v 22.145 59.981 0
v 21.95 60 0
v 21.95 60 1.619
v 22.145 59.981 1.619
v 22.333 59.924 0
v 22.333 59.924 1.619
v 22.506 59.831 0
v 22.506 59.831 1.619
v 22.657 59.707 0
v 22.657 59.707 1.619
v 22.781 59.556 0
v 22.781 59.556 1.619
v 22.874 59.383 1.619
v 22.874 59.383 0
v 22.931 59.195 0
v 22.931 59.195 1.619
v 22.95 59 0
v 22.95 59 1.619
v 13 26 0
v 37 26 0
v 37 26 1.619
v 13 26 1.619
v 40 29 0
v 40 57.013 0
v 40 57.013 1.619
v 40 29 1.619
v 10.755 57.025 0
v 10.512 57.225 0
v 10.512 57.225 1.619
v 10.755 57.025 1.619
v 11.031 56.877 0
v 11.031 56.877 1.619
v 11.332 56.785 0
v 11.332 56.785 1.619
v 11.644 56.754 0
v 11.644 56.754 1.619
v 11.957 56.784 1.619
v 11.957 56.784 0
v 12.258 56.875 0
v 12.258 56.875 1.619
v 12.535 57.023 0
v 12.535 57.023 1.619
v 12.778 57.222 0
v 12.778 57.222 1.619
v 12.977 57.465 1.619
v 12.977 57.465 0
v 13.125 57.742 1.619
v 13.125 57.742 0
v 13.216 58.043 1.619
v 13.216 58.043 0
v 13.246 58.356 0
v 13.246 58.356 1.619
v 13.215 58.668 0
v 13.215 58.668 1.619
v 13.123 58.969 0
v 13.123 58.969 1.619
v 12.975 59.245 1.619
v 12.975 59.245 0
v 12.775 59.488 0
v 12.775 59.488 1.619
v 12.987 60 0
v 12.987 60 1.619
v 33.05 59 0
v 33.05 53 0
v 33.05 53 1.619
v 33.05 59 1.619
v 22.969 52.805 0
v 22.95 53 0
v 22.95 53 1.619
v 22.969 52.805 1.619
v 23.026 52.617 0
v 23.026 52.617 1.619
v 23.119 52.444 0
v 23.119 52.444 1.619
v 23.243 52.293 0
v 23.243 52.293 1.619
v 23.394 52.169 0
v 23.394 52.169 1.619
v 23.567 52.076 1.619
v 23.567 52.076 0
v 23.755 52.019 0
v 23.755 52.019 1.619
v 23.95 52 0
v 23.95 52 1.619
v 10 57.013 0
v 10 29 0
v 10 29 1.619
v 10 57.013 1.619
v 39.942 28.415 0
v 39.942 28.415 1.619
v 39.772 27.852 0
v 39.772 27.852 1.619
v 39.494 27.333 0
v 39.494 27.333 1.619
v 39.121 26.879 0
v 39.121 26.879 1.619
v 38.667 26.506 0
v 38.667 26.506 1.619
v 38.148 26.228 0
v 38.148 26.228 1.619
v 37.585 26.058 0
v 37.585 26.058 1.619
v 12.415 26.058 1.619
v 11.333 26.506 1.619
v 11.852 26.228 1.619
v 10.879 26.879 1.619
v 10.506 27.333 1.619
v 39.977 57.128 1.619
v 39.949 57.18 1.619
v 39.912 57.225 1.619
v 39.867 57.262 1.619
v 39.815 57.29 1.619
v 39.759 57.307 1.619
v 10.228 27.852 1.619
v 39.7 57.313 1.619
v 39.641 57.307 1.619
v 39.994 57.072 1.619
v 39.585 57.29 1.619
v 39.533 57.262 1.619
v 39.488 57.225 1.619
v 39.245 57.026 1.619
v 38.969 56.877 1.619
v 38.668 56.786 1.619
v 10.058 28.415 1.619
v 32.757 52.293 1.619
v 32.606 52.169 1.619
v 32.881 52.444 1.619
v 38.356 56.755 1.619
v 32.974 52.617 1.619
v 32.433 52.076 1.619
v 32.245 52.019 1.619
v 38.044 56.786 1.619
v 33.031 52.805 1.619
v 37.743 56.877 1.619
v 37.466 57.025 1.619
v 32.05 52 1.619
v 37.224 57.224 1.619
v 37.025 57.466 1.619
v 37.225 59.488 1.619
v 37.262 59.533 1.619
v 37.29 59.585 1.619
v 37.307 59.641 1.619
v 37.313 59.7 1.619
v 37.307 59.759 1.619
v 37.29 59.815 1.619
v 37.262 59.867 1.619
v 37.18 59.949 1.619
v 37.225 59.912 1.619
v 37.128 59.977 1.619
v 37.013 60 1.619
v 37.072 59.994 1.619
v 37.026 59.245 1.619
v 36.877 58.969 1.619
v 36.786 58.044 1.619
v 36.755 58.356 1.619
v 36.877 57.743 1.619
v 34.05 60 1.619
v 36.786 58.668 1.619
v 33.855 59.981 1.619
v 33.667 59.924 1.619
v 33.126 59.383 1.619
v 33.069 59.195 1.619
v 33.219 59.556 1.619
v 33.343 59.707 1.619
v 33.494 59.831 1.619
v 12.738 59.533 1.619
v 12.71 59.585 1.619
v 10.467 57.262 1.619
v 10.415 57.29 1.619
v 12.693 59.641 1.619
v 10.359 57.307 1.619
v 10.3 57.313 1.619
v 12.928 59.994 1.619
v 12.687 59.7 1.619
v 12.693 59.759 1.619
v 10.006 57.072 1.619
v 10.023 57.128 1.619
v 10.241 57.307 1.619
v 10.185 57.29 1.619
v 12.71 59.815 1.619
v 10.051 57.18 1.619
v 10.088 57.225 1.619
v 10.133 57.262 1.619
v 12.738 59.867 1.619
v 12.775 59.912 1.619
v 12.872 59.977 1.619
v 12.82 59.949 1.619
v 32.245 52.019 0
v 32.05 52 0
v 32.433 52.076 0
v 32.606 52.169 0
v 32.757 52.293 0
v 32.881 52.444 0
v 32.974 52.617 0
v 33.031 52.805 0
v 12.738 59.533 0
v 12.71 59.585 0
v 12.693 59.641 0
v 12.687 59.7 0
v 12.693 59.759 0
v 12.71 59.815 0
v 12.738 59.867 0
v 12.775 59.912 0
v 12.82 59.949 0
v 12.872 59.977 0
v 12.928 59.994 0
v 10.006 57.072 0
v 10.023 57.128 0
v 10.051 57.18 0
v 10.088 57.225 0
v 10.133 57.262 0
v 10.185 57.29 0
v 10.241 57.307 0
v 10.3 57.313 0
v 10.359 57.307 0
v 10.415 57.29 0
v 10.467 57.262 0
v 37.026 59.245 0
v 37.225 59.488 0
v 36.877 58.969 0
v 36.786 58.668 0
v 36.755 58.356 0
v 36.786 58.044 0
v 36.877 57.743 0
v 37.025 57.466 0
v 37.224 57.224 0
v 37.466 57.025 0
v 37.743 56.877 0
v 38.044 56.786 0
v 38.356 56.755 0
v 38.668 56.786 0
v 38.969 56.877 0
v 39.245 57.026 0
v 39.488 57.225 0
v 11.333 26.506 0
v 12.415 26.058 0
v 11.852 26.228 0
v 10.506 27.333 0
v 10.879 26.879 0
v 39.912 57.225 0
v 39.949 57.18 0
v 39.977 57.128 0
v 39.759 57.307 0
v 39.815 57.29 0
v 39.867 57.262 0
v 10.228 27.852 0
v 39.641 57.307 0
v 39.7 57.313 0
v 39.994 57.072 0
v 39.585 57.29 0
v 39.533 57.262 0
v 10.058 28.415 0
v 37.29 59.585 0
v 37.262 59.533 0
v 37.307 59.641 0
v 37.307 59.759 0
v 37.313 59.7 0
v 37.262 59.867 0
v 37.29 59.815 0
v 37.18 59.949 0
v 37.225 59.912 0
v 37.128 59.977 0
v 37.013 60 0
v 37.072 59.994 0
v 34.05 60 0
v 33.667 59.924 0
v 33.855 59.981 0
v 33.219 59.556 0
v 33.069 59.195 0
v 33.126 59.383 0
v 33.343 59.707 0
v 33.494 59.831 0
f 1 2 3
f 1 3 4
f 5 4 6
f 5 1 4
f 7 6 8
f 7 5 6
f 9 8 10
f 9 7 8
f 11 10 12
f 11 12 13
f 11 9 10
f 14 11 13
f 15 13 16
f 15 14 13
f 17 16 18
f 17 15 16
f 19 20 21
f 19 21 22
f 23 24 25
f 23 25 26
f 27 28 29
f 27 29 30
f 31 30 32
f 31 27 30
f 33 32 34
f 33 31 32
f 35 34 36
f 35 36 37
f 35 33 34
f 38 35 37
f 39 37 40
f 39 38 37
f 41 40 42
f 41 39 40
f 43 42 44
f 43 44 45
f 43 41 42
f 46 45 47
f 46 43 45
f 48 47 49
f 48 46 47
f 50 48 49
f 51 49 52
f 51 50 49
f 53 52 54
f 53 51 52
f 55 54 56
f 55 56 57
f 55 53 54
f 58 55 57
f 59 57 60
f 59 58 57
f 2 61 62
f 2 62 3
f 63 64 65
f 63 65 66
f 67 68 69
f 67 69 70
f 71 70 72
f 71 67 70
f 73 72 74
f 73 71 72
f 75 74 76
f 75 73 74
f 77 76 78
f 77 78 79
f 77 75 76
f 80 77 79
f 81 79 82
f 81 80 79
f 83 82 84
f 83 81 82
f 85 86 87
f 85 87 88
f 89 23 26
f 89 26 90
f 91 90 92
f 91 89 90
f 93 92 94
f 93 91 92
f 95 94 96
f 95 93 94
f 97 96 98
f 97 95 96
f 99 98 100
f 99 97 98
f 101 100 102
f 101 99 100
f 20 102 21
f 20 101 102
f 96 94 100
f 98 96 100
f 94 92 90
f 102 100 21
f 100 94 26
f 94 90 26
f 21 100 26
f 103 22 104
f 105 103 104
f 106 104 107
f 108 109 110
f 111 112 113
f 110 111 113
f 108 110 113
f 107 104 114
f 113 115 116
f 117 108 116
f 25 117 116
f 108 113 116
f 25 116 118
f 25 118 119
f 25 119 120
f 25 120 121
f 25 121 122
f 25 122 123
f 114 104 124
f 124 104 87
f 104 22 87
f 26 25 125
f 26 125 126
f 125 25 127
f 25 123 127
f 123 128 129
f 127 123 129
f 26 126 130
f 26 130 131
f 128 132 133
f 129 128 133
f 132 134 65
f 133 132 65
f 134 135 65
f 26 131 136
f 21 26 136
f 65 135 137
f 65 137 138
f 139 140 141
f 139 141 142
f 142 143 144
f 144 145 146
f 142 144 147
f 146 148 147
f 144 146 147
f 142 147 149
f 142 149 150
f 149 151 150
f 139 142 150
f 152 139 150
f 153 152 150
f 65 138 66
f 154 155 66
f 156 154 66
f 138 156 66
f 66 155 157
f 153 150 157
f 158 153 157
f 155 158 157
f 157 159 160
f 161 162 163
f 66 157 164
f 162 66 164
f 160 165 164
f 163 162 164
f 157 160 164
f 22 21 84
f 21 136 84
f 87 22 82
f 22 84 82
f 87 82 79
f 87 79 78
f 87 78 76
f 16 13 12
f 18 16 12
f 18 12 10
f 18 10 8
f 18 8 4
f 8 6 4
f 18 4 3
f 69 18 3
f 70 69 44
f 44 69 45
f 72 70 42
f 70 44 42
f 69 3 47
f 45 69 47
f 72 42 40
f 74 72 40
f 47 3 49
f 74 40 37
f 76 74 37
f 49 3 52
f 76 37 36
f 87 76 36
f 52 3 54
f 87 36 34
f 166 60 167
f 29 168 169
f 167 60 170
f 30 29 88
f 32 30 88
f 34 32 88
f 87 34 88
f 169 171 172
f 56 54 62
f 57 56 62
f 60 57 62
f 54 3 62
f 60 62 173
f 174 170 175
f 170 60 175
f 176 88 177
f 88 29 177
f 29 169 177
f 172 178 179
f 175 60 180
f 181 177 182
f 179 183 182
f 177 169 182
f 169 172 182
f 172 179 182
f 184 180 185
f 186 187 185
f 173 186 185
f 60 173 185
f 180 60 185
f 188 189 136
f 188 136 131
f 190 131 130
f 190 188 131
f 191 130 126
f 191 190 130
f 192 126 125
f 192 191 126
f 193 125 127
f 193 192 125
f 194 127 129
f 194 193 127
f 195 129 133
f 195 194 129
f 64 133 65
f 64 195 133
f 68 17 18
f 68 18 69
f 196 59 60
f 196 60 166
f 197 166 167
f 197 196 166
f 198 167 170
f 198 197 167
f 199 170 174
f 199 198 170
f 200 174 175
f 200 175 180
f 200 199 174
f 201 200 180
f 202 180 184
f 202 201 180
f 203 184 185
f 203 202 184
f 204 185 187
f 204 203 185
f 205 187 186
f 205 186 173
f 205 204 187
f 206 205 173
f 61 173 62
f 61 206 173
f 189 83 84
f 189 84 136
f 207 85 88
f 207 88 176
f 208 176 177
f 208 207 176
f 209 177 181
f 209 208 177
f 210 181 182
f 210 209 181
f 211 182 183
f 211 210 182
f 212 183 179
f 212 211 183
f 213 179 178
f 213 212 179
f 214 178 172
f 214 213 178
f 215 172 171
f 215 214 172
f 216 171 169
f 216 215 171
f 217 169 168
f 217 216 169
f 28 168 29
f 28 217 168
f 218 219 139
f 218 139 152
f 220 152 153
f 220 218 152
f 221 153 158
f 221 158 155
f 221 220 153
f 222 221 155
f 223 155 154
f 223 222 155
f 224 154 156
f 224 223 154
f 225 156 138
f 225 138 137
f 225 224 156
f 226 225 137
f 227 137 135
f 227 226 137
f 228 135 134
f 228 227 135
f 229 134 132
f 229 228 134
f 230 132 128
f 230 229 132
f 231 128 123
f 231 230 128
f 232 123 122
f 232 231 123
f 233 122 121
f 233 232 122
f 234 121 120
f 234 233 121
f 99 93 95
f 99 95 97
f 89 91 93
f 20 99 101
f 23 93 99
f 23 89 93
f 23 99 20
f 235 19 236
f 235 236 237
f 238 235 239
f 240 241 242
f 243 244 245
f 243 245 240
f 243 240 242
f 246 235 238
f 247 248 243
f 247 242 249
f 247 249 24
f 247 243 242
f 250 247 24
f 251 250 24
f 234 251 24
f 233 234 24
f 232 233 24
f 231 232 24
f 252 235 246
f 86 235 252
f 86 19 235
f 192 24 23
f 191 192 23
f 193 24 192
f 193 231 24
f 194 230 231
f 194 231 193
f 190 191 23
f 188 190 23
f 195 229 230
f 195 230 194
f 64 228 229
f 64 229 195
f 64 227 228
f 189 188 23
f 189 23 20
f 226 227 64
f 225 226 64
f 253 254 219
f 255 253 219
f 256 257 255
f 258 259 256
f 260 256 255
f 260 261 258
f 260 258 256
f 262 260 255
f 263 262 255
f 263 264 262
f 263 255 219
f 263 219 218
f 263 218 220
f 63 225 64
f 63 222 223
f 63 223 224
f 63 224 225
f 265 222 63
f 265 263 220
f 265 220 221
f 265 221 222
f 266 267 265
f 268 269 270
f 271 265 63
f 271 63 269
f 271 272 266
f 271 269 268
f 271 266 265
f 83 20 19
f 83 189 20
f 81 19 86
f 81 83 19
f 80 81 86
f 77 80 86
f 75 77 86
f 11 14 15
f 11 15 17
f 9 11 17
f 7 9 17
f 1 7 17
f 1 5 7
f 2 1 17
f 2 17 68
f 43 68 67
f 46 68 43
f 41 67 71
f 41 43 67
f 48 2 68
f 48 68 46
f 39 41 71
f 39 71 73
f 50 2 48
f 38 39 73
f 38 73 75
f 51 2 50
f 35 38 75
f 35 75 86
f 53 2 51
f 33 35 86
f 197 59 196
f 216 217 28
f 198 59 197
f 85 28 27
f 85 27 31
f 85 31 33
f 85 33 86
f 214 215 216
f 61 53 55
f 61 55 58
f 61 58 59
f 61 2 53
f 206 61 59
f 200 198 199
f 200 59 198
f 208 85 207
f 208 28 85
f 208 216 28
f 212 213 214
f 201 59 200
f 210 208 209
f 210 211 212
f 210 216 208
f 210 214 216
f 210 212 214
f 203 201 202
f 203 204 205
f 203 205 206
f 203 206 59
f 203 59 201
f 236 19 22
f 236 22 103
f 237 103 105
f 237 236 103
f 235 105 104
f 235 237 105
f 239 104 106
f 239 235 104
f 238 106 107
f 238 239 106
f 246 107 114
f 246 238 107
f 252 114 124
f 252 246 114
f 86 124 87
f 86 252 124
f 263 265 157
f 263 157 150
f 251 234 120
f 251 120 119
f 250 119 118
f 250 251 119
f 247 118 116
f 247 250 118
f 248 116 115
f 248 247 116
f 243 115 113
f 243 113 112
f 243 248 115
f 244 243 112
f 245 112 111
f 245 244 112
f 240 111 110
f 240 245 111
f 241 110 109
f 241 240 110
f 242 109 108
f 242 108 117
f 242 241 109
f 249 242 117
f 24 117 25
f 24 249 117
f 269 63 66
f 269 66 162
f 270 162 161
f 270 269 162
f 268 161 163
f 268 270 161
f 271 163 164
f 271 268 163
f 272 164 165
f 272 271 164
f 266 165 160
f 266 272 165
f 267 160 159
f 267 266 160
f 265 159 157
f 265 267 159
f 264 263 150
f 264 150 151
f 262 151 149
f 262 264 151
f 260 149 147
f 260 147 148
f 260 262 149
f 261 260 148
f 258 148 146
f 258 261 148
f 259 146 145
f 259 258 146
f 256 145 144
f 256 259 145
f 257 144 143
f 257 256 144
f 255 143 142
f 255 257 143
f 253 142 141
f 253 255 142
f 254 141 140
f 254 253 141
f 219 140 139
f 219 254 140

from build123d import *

# Parameters (mm, degrees)
BOARD_DEPTH = 1.6194


with BuildPart() as part:
    # Sketch1 → Board (new body)
    with BuildSketch(Plane.XY):
        with BuildLine():
            Line((10, 29), (10, 57.01299))
            ThreePointArc((10, 57.01299), (10.185190901, 57.290158106), (10.51213, 57.22513))
            ThreePointArc((10.51213, 57.22513), (12.777621512, 57.222368475), (12.77487, 59.48786))
            ThreePointArc((12.77487, 59.48786), (12.709829188, 59.814802566), (12.987, 60))
            Line((12.987, 60), (21.95, 60))
            ThreePointArc((21.95, 60), (22.657106781, 59.707106781), (22.95, 59))
            Line((22.95, 59), (22.95, 53))
            ThreePointArc((22.95, 53), (23.242893219, 52.292893219), (23.95, 52))
            Line((23.95, 52), (32.05, 52))
            ThreePointArc((32.05, 52), (32.757106781, 52.292893219), (33.05, 53))
            Line((33.05, 53), (33.05, 59))
            ThreePointArc((33.05, 59), (33.342893219, 59.707106781), (34.05, 60))
            Line((34.05, 60), (37.01299, 60))
            ThreePointArc((37.01299, 60), (37.290150019, 59.814804479), (37.22512, 59.48787))
            ThreePointArc((37.22512, 59.48787), (37.223732391, 57.223742391), (39.48786, 57.22513))
            ThreePointArc((39.48786, 57.22513), (39.814807186, 57.290168899), (40, 57.01299))
            Line((40, 57.01299), (40, 29))
            ThreePointArc((40, 29), (39.121323273, 26.878676727), (37, 26))
            Line((37, 26), (13, 26))
            ThreePointArc((13, 26), (10.878679656, 26.878679656), (10, 29))
        make_face()
    extrude(amount=BOARD_DEPTH)


solid = part.part
